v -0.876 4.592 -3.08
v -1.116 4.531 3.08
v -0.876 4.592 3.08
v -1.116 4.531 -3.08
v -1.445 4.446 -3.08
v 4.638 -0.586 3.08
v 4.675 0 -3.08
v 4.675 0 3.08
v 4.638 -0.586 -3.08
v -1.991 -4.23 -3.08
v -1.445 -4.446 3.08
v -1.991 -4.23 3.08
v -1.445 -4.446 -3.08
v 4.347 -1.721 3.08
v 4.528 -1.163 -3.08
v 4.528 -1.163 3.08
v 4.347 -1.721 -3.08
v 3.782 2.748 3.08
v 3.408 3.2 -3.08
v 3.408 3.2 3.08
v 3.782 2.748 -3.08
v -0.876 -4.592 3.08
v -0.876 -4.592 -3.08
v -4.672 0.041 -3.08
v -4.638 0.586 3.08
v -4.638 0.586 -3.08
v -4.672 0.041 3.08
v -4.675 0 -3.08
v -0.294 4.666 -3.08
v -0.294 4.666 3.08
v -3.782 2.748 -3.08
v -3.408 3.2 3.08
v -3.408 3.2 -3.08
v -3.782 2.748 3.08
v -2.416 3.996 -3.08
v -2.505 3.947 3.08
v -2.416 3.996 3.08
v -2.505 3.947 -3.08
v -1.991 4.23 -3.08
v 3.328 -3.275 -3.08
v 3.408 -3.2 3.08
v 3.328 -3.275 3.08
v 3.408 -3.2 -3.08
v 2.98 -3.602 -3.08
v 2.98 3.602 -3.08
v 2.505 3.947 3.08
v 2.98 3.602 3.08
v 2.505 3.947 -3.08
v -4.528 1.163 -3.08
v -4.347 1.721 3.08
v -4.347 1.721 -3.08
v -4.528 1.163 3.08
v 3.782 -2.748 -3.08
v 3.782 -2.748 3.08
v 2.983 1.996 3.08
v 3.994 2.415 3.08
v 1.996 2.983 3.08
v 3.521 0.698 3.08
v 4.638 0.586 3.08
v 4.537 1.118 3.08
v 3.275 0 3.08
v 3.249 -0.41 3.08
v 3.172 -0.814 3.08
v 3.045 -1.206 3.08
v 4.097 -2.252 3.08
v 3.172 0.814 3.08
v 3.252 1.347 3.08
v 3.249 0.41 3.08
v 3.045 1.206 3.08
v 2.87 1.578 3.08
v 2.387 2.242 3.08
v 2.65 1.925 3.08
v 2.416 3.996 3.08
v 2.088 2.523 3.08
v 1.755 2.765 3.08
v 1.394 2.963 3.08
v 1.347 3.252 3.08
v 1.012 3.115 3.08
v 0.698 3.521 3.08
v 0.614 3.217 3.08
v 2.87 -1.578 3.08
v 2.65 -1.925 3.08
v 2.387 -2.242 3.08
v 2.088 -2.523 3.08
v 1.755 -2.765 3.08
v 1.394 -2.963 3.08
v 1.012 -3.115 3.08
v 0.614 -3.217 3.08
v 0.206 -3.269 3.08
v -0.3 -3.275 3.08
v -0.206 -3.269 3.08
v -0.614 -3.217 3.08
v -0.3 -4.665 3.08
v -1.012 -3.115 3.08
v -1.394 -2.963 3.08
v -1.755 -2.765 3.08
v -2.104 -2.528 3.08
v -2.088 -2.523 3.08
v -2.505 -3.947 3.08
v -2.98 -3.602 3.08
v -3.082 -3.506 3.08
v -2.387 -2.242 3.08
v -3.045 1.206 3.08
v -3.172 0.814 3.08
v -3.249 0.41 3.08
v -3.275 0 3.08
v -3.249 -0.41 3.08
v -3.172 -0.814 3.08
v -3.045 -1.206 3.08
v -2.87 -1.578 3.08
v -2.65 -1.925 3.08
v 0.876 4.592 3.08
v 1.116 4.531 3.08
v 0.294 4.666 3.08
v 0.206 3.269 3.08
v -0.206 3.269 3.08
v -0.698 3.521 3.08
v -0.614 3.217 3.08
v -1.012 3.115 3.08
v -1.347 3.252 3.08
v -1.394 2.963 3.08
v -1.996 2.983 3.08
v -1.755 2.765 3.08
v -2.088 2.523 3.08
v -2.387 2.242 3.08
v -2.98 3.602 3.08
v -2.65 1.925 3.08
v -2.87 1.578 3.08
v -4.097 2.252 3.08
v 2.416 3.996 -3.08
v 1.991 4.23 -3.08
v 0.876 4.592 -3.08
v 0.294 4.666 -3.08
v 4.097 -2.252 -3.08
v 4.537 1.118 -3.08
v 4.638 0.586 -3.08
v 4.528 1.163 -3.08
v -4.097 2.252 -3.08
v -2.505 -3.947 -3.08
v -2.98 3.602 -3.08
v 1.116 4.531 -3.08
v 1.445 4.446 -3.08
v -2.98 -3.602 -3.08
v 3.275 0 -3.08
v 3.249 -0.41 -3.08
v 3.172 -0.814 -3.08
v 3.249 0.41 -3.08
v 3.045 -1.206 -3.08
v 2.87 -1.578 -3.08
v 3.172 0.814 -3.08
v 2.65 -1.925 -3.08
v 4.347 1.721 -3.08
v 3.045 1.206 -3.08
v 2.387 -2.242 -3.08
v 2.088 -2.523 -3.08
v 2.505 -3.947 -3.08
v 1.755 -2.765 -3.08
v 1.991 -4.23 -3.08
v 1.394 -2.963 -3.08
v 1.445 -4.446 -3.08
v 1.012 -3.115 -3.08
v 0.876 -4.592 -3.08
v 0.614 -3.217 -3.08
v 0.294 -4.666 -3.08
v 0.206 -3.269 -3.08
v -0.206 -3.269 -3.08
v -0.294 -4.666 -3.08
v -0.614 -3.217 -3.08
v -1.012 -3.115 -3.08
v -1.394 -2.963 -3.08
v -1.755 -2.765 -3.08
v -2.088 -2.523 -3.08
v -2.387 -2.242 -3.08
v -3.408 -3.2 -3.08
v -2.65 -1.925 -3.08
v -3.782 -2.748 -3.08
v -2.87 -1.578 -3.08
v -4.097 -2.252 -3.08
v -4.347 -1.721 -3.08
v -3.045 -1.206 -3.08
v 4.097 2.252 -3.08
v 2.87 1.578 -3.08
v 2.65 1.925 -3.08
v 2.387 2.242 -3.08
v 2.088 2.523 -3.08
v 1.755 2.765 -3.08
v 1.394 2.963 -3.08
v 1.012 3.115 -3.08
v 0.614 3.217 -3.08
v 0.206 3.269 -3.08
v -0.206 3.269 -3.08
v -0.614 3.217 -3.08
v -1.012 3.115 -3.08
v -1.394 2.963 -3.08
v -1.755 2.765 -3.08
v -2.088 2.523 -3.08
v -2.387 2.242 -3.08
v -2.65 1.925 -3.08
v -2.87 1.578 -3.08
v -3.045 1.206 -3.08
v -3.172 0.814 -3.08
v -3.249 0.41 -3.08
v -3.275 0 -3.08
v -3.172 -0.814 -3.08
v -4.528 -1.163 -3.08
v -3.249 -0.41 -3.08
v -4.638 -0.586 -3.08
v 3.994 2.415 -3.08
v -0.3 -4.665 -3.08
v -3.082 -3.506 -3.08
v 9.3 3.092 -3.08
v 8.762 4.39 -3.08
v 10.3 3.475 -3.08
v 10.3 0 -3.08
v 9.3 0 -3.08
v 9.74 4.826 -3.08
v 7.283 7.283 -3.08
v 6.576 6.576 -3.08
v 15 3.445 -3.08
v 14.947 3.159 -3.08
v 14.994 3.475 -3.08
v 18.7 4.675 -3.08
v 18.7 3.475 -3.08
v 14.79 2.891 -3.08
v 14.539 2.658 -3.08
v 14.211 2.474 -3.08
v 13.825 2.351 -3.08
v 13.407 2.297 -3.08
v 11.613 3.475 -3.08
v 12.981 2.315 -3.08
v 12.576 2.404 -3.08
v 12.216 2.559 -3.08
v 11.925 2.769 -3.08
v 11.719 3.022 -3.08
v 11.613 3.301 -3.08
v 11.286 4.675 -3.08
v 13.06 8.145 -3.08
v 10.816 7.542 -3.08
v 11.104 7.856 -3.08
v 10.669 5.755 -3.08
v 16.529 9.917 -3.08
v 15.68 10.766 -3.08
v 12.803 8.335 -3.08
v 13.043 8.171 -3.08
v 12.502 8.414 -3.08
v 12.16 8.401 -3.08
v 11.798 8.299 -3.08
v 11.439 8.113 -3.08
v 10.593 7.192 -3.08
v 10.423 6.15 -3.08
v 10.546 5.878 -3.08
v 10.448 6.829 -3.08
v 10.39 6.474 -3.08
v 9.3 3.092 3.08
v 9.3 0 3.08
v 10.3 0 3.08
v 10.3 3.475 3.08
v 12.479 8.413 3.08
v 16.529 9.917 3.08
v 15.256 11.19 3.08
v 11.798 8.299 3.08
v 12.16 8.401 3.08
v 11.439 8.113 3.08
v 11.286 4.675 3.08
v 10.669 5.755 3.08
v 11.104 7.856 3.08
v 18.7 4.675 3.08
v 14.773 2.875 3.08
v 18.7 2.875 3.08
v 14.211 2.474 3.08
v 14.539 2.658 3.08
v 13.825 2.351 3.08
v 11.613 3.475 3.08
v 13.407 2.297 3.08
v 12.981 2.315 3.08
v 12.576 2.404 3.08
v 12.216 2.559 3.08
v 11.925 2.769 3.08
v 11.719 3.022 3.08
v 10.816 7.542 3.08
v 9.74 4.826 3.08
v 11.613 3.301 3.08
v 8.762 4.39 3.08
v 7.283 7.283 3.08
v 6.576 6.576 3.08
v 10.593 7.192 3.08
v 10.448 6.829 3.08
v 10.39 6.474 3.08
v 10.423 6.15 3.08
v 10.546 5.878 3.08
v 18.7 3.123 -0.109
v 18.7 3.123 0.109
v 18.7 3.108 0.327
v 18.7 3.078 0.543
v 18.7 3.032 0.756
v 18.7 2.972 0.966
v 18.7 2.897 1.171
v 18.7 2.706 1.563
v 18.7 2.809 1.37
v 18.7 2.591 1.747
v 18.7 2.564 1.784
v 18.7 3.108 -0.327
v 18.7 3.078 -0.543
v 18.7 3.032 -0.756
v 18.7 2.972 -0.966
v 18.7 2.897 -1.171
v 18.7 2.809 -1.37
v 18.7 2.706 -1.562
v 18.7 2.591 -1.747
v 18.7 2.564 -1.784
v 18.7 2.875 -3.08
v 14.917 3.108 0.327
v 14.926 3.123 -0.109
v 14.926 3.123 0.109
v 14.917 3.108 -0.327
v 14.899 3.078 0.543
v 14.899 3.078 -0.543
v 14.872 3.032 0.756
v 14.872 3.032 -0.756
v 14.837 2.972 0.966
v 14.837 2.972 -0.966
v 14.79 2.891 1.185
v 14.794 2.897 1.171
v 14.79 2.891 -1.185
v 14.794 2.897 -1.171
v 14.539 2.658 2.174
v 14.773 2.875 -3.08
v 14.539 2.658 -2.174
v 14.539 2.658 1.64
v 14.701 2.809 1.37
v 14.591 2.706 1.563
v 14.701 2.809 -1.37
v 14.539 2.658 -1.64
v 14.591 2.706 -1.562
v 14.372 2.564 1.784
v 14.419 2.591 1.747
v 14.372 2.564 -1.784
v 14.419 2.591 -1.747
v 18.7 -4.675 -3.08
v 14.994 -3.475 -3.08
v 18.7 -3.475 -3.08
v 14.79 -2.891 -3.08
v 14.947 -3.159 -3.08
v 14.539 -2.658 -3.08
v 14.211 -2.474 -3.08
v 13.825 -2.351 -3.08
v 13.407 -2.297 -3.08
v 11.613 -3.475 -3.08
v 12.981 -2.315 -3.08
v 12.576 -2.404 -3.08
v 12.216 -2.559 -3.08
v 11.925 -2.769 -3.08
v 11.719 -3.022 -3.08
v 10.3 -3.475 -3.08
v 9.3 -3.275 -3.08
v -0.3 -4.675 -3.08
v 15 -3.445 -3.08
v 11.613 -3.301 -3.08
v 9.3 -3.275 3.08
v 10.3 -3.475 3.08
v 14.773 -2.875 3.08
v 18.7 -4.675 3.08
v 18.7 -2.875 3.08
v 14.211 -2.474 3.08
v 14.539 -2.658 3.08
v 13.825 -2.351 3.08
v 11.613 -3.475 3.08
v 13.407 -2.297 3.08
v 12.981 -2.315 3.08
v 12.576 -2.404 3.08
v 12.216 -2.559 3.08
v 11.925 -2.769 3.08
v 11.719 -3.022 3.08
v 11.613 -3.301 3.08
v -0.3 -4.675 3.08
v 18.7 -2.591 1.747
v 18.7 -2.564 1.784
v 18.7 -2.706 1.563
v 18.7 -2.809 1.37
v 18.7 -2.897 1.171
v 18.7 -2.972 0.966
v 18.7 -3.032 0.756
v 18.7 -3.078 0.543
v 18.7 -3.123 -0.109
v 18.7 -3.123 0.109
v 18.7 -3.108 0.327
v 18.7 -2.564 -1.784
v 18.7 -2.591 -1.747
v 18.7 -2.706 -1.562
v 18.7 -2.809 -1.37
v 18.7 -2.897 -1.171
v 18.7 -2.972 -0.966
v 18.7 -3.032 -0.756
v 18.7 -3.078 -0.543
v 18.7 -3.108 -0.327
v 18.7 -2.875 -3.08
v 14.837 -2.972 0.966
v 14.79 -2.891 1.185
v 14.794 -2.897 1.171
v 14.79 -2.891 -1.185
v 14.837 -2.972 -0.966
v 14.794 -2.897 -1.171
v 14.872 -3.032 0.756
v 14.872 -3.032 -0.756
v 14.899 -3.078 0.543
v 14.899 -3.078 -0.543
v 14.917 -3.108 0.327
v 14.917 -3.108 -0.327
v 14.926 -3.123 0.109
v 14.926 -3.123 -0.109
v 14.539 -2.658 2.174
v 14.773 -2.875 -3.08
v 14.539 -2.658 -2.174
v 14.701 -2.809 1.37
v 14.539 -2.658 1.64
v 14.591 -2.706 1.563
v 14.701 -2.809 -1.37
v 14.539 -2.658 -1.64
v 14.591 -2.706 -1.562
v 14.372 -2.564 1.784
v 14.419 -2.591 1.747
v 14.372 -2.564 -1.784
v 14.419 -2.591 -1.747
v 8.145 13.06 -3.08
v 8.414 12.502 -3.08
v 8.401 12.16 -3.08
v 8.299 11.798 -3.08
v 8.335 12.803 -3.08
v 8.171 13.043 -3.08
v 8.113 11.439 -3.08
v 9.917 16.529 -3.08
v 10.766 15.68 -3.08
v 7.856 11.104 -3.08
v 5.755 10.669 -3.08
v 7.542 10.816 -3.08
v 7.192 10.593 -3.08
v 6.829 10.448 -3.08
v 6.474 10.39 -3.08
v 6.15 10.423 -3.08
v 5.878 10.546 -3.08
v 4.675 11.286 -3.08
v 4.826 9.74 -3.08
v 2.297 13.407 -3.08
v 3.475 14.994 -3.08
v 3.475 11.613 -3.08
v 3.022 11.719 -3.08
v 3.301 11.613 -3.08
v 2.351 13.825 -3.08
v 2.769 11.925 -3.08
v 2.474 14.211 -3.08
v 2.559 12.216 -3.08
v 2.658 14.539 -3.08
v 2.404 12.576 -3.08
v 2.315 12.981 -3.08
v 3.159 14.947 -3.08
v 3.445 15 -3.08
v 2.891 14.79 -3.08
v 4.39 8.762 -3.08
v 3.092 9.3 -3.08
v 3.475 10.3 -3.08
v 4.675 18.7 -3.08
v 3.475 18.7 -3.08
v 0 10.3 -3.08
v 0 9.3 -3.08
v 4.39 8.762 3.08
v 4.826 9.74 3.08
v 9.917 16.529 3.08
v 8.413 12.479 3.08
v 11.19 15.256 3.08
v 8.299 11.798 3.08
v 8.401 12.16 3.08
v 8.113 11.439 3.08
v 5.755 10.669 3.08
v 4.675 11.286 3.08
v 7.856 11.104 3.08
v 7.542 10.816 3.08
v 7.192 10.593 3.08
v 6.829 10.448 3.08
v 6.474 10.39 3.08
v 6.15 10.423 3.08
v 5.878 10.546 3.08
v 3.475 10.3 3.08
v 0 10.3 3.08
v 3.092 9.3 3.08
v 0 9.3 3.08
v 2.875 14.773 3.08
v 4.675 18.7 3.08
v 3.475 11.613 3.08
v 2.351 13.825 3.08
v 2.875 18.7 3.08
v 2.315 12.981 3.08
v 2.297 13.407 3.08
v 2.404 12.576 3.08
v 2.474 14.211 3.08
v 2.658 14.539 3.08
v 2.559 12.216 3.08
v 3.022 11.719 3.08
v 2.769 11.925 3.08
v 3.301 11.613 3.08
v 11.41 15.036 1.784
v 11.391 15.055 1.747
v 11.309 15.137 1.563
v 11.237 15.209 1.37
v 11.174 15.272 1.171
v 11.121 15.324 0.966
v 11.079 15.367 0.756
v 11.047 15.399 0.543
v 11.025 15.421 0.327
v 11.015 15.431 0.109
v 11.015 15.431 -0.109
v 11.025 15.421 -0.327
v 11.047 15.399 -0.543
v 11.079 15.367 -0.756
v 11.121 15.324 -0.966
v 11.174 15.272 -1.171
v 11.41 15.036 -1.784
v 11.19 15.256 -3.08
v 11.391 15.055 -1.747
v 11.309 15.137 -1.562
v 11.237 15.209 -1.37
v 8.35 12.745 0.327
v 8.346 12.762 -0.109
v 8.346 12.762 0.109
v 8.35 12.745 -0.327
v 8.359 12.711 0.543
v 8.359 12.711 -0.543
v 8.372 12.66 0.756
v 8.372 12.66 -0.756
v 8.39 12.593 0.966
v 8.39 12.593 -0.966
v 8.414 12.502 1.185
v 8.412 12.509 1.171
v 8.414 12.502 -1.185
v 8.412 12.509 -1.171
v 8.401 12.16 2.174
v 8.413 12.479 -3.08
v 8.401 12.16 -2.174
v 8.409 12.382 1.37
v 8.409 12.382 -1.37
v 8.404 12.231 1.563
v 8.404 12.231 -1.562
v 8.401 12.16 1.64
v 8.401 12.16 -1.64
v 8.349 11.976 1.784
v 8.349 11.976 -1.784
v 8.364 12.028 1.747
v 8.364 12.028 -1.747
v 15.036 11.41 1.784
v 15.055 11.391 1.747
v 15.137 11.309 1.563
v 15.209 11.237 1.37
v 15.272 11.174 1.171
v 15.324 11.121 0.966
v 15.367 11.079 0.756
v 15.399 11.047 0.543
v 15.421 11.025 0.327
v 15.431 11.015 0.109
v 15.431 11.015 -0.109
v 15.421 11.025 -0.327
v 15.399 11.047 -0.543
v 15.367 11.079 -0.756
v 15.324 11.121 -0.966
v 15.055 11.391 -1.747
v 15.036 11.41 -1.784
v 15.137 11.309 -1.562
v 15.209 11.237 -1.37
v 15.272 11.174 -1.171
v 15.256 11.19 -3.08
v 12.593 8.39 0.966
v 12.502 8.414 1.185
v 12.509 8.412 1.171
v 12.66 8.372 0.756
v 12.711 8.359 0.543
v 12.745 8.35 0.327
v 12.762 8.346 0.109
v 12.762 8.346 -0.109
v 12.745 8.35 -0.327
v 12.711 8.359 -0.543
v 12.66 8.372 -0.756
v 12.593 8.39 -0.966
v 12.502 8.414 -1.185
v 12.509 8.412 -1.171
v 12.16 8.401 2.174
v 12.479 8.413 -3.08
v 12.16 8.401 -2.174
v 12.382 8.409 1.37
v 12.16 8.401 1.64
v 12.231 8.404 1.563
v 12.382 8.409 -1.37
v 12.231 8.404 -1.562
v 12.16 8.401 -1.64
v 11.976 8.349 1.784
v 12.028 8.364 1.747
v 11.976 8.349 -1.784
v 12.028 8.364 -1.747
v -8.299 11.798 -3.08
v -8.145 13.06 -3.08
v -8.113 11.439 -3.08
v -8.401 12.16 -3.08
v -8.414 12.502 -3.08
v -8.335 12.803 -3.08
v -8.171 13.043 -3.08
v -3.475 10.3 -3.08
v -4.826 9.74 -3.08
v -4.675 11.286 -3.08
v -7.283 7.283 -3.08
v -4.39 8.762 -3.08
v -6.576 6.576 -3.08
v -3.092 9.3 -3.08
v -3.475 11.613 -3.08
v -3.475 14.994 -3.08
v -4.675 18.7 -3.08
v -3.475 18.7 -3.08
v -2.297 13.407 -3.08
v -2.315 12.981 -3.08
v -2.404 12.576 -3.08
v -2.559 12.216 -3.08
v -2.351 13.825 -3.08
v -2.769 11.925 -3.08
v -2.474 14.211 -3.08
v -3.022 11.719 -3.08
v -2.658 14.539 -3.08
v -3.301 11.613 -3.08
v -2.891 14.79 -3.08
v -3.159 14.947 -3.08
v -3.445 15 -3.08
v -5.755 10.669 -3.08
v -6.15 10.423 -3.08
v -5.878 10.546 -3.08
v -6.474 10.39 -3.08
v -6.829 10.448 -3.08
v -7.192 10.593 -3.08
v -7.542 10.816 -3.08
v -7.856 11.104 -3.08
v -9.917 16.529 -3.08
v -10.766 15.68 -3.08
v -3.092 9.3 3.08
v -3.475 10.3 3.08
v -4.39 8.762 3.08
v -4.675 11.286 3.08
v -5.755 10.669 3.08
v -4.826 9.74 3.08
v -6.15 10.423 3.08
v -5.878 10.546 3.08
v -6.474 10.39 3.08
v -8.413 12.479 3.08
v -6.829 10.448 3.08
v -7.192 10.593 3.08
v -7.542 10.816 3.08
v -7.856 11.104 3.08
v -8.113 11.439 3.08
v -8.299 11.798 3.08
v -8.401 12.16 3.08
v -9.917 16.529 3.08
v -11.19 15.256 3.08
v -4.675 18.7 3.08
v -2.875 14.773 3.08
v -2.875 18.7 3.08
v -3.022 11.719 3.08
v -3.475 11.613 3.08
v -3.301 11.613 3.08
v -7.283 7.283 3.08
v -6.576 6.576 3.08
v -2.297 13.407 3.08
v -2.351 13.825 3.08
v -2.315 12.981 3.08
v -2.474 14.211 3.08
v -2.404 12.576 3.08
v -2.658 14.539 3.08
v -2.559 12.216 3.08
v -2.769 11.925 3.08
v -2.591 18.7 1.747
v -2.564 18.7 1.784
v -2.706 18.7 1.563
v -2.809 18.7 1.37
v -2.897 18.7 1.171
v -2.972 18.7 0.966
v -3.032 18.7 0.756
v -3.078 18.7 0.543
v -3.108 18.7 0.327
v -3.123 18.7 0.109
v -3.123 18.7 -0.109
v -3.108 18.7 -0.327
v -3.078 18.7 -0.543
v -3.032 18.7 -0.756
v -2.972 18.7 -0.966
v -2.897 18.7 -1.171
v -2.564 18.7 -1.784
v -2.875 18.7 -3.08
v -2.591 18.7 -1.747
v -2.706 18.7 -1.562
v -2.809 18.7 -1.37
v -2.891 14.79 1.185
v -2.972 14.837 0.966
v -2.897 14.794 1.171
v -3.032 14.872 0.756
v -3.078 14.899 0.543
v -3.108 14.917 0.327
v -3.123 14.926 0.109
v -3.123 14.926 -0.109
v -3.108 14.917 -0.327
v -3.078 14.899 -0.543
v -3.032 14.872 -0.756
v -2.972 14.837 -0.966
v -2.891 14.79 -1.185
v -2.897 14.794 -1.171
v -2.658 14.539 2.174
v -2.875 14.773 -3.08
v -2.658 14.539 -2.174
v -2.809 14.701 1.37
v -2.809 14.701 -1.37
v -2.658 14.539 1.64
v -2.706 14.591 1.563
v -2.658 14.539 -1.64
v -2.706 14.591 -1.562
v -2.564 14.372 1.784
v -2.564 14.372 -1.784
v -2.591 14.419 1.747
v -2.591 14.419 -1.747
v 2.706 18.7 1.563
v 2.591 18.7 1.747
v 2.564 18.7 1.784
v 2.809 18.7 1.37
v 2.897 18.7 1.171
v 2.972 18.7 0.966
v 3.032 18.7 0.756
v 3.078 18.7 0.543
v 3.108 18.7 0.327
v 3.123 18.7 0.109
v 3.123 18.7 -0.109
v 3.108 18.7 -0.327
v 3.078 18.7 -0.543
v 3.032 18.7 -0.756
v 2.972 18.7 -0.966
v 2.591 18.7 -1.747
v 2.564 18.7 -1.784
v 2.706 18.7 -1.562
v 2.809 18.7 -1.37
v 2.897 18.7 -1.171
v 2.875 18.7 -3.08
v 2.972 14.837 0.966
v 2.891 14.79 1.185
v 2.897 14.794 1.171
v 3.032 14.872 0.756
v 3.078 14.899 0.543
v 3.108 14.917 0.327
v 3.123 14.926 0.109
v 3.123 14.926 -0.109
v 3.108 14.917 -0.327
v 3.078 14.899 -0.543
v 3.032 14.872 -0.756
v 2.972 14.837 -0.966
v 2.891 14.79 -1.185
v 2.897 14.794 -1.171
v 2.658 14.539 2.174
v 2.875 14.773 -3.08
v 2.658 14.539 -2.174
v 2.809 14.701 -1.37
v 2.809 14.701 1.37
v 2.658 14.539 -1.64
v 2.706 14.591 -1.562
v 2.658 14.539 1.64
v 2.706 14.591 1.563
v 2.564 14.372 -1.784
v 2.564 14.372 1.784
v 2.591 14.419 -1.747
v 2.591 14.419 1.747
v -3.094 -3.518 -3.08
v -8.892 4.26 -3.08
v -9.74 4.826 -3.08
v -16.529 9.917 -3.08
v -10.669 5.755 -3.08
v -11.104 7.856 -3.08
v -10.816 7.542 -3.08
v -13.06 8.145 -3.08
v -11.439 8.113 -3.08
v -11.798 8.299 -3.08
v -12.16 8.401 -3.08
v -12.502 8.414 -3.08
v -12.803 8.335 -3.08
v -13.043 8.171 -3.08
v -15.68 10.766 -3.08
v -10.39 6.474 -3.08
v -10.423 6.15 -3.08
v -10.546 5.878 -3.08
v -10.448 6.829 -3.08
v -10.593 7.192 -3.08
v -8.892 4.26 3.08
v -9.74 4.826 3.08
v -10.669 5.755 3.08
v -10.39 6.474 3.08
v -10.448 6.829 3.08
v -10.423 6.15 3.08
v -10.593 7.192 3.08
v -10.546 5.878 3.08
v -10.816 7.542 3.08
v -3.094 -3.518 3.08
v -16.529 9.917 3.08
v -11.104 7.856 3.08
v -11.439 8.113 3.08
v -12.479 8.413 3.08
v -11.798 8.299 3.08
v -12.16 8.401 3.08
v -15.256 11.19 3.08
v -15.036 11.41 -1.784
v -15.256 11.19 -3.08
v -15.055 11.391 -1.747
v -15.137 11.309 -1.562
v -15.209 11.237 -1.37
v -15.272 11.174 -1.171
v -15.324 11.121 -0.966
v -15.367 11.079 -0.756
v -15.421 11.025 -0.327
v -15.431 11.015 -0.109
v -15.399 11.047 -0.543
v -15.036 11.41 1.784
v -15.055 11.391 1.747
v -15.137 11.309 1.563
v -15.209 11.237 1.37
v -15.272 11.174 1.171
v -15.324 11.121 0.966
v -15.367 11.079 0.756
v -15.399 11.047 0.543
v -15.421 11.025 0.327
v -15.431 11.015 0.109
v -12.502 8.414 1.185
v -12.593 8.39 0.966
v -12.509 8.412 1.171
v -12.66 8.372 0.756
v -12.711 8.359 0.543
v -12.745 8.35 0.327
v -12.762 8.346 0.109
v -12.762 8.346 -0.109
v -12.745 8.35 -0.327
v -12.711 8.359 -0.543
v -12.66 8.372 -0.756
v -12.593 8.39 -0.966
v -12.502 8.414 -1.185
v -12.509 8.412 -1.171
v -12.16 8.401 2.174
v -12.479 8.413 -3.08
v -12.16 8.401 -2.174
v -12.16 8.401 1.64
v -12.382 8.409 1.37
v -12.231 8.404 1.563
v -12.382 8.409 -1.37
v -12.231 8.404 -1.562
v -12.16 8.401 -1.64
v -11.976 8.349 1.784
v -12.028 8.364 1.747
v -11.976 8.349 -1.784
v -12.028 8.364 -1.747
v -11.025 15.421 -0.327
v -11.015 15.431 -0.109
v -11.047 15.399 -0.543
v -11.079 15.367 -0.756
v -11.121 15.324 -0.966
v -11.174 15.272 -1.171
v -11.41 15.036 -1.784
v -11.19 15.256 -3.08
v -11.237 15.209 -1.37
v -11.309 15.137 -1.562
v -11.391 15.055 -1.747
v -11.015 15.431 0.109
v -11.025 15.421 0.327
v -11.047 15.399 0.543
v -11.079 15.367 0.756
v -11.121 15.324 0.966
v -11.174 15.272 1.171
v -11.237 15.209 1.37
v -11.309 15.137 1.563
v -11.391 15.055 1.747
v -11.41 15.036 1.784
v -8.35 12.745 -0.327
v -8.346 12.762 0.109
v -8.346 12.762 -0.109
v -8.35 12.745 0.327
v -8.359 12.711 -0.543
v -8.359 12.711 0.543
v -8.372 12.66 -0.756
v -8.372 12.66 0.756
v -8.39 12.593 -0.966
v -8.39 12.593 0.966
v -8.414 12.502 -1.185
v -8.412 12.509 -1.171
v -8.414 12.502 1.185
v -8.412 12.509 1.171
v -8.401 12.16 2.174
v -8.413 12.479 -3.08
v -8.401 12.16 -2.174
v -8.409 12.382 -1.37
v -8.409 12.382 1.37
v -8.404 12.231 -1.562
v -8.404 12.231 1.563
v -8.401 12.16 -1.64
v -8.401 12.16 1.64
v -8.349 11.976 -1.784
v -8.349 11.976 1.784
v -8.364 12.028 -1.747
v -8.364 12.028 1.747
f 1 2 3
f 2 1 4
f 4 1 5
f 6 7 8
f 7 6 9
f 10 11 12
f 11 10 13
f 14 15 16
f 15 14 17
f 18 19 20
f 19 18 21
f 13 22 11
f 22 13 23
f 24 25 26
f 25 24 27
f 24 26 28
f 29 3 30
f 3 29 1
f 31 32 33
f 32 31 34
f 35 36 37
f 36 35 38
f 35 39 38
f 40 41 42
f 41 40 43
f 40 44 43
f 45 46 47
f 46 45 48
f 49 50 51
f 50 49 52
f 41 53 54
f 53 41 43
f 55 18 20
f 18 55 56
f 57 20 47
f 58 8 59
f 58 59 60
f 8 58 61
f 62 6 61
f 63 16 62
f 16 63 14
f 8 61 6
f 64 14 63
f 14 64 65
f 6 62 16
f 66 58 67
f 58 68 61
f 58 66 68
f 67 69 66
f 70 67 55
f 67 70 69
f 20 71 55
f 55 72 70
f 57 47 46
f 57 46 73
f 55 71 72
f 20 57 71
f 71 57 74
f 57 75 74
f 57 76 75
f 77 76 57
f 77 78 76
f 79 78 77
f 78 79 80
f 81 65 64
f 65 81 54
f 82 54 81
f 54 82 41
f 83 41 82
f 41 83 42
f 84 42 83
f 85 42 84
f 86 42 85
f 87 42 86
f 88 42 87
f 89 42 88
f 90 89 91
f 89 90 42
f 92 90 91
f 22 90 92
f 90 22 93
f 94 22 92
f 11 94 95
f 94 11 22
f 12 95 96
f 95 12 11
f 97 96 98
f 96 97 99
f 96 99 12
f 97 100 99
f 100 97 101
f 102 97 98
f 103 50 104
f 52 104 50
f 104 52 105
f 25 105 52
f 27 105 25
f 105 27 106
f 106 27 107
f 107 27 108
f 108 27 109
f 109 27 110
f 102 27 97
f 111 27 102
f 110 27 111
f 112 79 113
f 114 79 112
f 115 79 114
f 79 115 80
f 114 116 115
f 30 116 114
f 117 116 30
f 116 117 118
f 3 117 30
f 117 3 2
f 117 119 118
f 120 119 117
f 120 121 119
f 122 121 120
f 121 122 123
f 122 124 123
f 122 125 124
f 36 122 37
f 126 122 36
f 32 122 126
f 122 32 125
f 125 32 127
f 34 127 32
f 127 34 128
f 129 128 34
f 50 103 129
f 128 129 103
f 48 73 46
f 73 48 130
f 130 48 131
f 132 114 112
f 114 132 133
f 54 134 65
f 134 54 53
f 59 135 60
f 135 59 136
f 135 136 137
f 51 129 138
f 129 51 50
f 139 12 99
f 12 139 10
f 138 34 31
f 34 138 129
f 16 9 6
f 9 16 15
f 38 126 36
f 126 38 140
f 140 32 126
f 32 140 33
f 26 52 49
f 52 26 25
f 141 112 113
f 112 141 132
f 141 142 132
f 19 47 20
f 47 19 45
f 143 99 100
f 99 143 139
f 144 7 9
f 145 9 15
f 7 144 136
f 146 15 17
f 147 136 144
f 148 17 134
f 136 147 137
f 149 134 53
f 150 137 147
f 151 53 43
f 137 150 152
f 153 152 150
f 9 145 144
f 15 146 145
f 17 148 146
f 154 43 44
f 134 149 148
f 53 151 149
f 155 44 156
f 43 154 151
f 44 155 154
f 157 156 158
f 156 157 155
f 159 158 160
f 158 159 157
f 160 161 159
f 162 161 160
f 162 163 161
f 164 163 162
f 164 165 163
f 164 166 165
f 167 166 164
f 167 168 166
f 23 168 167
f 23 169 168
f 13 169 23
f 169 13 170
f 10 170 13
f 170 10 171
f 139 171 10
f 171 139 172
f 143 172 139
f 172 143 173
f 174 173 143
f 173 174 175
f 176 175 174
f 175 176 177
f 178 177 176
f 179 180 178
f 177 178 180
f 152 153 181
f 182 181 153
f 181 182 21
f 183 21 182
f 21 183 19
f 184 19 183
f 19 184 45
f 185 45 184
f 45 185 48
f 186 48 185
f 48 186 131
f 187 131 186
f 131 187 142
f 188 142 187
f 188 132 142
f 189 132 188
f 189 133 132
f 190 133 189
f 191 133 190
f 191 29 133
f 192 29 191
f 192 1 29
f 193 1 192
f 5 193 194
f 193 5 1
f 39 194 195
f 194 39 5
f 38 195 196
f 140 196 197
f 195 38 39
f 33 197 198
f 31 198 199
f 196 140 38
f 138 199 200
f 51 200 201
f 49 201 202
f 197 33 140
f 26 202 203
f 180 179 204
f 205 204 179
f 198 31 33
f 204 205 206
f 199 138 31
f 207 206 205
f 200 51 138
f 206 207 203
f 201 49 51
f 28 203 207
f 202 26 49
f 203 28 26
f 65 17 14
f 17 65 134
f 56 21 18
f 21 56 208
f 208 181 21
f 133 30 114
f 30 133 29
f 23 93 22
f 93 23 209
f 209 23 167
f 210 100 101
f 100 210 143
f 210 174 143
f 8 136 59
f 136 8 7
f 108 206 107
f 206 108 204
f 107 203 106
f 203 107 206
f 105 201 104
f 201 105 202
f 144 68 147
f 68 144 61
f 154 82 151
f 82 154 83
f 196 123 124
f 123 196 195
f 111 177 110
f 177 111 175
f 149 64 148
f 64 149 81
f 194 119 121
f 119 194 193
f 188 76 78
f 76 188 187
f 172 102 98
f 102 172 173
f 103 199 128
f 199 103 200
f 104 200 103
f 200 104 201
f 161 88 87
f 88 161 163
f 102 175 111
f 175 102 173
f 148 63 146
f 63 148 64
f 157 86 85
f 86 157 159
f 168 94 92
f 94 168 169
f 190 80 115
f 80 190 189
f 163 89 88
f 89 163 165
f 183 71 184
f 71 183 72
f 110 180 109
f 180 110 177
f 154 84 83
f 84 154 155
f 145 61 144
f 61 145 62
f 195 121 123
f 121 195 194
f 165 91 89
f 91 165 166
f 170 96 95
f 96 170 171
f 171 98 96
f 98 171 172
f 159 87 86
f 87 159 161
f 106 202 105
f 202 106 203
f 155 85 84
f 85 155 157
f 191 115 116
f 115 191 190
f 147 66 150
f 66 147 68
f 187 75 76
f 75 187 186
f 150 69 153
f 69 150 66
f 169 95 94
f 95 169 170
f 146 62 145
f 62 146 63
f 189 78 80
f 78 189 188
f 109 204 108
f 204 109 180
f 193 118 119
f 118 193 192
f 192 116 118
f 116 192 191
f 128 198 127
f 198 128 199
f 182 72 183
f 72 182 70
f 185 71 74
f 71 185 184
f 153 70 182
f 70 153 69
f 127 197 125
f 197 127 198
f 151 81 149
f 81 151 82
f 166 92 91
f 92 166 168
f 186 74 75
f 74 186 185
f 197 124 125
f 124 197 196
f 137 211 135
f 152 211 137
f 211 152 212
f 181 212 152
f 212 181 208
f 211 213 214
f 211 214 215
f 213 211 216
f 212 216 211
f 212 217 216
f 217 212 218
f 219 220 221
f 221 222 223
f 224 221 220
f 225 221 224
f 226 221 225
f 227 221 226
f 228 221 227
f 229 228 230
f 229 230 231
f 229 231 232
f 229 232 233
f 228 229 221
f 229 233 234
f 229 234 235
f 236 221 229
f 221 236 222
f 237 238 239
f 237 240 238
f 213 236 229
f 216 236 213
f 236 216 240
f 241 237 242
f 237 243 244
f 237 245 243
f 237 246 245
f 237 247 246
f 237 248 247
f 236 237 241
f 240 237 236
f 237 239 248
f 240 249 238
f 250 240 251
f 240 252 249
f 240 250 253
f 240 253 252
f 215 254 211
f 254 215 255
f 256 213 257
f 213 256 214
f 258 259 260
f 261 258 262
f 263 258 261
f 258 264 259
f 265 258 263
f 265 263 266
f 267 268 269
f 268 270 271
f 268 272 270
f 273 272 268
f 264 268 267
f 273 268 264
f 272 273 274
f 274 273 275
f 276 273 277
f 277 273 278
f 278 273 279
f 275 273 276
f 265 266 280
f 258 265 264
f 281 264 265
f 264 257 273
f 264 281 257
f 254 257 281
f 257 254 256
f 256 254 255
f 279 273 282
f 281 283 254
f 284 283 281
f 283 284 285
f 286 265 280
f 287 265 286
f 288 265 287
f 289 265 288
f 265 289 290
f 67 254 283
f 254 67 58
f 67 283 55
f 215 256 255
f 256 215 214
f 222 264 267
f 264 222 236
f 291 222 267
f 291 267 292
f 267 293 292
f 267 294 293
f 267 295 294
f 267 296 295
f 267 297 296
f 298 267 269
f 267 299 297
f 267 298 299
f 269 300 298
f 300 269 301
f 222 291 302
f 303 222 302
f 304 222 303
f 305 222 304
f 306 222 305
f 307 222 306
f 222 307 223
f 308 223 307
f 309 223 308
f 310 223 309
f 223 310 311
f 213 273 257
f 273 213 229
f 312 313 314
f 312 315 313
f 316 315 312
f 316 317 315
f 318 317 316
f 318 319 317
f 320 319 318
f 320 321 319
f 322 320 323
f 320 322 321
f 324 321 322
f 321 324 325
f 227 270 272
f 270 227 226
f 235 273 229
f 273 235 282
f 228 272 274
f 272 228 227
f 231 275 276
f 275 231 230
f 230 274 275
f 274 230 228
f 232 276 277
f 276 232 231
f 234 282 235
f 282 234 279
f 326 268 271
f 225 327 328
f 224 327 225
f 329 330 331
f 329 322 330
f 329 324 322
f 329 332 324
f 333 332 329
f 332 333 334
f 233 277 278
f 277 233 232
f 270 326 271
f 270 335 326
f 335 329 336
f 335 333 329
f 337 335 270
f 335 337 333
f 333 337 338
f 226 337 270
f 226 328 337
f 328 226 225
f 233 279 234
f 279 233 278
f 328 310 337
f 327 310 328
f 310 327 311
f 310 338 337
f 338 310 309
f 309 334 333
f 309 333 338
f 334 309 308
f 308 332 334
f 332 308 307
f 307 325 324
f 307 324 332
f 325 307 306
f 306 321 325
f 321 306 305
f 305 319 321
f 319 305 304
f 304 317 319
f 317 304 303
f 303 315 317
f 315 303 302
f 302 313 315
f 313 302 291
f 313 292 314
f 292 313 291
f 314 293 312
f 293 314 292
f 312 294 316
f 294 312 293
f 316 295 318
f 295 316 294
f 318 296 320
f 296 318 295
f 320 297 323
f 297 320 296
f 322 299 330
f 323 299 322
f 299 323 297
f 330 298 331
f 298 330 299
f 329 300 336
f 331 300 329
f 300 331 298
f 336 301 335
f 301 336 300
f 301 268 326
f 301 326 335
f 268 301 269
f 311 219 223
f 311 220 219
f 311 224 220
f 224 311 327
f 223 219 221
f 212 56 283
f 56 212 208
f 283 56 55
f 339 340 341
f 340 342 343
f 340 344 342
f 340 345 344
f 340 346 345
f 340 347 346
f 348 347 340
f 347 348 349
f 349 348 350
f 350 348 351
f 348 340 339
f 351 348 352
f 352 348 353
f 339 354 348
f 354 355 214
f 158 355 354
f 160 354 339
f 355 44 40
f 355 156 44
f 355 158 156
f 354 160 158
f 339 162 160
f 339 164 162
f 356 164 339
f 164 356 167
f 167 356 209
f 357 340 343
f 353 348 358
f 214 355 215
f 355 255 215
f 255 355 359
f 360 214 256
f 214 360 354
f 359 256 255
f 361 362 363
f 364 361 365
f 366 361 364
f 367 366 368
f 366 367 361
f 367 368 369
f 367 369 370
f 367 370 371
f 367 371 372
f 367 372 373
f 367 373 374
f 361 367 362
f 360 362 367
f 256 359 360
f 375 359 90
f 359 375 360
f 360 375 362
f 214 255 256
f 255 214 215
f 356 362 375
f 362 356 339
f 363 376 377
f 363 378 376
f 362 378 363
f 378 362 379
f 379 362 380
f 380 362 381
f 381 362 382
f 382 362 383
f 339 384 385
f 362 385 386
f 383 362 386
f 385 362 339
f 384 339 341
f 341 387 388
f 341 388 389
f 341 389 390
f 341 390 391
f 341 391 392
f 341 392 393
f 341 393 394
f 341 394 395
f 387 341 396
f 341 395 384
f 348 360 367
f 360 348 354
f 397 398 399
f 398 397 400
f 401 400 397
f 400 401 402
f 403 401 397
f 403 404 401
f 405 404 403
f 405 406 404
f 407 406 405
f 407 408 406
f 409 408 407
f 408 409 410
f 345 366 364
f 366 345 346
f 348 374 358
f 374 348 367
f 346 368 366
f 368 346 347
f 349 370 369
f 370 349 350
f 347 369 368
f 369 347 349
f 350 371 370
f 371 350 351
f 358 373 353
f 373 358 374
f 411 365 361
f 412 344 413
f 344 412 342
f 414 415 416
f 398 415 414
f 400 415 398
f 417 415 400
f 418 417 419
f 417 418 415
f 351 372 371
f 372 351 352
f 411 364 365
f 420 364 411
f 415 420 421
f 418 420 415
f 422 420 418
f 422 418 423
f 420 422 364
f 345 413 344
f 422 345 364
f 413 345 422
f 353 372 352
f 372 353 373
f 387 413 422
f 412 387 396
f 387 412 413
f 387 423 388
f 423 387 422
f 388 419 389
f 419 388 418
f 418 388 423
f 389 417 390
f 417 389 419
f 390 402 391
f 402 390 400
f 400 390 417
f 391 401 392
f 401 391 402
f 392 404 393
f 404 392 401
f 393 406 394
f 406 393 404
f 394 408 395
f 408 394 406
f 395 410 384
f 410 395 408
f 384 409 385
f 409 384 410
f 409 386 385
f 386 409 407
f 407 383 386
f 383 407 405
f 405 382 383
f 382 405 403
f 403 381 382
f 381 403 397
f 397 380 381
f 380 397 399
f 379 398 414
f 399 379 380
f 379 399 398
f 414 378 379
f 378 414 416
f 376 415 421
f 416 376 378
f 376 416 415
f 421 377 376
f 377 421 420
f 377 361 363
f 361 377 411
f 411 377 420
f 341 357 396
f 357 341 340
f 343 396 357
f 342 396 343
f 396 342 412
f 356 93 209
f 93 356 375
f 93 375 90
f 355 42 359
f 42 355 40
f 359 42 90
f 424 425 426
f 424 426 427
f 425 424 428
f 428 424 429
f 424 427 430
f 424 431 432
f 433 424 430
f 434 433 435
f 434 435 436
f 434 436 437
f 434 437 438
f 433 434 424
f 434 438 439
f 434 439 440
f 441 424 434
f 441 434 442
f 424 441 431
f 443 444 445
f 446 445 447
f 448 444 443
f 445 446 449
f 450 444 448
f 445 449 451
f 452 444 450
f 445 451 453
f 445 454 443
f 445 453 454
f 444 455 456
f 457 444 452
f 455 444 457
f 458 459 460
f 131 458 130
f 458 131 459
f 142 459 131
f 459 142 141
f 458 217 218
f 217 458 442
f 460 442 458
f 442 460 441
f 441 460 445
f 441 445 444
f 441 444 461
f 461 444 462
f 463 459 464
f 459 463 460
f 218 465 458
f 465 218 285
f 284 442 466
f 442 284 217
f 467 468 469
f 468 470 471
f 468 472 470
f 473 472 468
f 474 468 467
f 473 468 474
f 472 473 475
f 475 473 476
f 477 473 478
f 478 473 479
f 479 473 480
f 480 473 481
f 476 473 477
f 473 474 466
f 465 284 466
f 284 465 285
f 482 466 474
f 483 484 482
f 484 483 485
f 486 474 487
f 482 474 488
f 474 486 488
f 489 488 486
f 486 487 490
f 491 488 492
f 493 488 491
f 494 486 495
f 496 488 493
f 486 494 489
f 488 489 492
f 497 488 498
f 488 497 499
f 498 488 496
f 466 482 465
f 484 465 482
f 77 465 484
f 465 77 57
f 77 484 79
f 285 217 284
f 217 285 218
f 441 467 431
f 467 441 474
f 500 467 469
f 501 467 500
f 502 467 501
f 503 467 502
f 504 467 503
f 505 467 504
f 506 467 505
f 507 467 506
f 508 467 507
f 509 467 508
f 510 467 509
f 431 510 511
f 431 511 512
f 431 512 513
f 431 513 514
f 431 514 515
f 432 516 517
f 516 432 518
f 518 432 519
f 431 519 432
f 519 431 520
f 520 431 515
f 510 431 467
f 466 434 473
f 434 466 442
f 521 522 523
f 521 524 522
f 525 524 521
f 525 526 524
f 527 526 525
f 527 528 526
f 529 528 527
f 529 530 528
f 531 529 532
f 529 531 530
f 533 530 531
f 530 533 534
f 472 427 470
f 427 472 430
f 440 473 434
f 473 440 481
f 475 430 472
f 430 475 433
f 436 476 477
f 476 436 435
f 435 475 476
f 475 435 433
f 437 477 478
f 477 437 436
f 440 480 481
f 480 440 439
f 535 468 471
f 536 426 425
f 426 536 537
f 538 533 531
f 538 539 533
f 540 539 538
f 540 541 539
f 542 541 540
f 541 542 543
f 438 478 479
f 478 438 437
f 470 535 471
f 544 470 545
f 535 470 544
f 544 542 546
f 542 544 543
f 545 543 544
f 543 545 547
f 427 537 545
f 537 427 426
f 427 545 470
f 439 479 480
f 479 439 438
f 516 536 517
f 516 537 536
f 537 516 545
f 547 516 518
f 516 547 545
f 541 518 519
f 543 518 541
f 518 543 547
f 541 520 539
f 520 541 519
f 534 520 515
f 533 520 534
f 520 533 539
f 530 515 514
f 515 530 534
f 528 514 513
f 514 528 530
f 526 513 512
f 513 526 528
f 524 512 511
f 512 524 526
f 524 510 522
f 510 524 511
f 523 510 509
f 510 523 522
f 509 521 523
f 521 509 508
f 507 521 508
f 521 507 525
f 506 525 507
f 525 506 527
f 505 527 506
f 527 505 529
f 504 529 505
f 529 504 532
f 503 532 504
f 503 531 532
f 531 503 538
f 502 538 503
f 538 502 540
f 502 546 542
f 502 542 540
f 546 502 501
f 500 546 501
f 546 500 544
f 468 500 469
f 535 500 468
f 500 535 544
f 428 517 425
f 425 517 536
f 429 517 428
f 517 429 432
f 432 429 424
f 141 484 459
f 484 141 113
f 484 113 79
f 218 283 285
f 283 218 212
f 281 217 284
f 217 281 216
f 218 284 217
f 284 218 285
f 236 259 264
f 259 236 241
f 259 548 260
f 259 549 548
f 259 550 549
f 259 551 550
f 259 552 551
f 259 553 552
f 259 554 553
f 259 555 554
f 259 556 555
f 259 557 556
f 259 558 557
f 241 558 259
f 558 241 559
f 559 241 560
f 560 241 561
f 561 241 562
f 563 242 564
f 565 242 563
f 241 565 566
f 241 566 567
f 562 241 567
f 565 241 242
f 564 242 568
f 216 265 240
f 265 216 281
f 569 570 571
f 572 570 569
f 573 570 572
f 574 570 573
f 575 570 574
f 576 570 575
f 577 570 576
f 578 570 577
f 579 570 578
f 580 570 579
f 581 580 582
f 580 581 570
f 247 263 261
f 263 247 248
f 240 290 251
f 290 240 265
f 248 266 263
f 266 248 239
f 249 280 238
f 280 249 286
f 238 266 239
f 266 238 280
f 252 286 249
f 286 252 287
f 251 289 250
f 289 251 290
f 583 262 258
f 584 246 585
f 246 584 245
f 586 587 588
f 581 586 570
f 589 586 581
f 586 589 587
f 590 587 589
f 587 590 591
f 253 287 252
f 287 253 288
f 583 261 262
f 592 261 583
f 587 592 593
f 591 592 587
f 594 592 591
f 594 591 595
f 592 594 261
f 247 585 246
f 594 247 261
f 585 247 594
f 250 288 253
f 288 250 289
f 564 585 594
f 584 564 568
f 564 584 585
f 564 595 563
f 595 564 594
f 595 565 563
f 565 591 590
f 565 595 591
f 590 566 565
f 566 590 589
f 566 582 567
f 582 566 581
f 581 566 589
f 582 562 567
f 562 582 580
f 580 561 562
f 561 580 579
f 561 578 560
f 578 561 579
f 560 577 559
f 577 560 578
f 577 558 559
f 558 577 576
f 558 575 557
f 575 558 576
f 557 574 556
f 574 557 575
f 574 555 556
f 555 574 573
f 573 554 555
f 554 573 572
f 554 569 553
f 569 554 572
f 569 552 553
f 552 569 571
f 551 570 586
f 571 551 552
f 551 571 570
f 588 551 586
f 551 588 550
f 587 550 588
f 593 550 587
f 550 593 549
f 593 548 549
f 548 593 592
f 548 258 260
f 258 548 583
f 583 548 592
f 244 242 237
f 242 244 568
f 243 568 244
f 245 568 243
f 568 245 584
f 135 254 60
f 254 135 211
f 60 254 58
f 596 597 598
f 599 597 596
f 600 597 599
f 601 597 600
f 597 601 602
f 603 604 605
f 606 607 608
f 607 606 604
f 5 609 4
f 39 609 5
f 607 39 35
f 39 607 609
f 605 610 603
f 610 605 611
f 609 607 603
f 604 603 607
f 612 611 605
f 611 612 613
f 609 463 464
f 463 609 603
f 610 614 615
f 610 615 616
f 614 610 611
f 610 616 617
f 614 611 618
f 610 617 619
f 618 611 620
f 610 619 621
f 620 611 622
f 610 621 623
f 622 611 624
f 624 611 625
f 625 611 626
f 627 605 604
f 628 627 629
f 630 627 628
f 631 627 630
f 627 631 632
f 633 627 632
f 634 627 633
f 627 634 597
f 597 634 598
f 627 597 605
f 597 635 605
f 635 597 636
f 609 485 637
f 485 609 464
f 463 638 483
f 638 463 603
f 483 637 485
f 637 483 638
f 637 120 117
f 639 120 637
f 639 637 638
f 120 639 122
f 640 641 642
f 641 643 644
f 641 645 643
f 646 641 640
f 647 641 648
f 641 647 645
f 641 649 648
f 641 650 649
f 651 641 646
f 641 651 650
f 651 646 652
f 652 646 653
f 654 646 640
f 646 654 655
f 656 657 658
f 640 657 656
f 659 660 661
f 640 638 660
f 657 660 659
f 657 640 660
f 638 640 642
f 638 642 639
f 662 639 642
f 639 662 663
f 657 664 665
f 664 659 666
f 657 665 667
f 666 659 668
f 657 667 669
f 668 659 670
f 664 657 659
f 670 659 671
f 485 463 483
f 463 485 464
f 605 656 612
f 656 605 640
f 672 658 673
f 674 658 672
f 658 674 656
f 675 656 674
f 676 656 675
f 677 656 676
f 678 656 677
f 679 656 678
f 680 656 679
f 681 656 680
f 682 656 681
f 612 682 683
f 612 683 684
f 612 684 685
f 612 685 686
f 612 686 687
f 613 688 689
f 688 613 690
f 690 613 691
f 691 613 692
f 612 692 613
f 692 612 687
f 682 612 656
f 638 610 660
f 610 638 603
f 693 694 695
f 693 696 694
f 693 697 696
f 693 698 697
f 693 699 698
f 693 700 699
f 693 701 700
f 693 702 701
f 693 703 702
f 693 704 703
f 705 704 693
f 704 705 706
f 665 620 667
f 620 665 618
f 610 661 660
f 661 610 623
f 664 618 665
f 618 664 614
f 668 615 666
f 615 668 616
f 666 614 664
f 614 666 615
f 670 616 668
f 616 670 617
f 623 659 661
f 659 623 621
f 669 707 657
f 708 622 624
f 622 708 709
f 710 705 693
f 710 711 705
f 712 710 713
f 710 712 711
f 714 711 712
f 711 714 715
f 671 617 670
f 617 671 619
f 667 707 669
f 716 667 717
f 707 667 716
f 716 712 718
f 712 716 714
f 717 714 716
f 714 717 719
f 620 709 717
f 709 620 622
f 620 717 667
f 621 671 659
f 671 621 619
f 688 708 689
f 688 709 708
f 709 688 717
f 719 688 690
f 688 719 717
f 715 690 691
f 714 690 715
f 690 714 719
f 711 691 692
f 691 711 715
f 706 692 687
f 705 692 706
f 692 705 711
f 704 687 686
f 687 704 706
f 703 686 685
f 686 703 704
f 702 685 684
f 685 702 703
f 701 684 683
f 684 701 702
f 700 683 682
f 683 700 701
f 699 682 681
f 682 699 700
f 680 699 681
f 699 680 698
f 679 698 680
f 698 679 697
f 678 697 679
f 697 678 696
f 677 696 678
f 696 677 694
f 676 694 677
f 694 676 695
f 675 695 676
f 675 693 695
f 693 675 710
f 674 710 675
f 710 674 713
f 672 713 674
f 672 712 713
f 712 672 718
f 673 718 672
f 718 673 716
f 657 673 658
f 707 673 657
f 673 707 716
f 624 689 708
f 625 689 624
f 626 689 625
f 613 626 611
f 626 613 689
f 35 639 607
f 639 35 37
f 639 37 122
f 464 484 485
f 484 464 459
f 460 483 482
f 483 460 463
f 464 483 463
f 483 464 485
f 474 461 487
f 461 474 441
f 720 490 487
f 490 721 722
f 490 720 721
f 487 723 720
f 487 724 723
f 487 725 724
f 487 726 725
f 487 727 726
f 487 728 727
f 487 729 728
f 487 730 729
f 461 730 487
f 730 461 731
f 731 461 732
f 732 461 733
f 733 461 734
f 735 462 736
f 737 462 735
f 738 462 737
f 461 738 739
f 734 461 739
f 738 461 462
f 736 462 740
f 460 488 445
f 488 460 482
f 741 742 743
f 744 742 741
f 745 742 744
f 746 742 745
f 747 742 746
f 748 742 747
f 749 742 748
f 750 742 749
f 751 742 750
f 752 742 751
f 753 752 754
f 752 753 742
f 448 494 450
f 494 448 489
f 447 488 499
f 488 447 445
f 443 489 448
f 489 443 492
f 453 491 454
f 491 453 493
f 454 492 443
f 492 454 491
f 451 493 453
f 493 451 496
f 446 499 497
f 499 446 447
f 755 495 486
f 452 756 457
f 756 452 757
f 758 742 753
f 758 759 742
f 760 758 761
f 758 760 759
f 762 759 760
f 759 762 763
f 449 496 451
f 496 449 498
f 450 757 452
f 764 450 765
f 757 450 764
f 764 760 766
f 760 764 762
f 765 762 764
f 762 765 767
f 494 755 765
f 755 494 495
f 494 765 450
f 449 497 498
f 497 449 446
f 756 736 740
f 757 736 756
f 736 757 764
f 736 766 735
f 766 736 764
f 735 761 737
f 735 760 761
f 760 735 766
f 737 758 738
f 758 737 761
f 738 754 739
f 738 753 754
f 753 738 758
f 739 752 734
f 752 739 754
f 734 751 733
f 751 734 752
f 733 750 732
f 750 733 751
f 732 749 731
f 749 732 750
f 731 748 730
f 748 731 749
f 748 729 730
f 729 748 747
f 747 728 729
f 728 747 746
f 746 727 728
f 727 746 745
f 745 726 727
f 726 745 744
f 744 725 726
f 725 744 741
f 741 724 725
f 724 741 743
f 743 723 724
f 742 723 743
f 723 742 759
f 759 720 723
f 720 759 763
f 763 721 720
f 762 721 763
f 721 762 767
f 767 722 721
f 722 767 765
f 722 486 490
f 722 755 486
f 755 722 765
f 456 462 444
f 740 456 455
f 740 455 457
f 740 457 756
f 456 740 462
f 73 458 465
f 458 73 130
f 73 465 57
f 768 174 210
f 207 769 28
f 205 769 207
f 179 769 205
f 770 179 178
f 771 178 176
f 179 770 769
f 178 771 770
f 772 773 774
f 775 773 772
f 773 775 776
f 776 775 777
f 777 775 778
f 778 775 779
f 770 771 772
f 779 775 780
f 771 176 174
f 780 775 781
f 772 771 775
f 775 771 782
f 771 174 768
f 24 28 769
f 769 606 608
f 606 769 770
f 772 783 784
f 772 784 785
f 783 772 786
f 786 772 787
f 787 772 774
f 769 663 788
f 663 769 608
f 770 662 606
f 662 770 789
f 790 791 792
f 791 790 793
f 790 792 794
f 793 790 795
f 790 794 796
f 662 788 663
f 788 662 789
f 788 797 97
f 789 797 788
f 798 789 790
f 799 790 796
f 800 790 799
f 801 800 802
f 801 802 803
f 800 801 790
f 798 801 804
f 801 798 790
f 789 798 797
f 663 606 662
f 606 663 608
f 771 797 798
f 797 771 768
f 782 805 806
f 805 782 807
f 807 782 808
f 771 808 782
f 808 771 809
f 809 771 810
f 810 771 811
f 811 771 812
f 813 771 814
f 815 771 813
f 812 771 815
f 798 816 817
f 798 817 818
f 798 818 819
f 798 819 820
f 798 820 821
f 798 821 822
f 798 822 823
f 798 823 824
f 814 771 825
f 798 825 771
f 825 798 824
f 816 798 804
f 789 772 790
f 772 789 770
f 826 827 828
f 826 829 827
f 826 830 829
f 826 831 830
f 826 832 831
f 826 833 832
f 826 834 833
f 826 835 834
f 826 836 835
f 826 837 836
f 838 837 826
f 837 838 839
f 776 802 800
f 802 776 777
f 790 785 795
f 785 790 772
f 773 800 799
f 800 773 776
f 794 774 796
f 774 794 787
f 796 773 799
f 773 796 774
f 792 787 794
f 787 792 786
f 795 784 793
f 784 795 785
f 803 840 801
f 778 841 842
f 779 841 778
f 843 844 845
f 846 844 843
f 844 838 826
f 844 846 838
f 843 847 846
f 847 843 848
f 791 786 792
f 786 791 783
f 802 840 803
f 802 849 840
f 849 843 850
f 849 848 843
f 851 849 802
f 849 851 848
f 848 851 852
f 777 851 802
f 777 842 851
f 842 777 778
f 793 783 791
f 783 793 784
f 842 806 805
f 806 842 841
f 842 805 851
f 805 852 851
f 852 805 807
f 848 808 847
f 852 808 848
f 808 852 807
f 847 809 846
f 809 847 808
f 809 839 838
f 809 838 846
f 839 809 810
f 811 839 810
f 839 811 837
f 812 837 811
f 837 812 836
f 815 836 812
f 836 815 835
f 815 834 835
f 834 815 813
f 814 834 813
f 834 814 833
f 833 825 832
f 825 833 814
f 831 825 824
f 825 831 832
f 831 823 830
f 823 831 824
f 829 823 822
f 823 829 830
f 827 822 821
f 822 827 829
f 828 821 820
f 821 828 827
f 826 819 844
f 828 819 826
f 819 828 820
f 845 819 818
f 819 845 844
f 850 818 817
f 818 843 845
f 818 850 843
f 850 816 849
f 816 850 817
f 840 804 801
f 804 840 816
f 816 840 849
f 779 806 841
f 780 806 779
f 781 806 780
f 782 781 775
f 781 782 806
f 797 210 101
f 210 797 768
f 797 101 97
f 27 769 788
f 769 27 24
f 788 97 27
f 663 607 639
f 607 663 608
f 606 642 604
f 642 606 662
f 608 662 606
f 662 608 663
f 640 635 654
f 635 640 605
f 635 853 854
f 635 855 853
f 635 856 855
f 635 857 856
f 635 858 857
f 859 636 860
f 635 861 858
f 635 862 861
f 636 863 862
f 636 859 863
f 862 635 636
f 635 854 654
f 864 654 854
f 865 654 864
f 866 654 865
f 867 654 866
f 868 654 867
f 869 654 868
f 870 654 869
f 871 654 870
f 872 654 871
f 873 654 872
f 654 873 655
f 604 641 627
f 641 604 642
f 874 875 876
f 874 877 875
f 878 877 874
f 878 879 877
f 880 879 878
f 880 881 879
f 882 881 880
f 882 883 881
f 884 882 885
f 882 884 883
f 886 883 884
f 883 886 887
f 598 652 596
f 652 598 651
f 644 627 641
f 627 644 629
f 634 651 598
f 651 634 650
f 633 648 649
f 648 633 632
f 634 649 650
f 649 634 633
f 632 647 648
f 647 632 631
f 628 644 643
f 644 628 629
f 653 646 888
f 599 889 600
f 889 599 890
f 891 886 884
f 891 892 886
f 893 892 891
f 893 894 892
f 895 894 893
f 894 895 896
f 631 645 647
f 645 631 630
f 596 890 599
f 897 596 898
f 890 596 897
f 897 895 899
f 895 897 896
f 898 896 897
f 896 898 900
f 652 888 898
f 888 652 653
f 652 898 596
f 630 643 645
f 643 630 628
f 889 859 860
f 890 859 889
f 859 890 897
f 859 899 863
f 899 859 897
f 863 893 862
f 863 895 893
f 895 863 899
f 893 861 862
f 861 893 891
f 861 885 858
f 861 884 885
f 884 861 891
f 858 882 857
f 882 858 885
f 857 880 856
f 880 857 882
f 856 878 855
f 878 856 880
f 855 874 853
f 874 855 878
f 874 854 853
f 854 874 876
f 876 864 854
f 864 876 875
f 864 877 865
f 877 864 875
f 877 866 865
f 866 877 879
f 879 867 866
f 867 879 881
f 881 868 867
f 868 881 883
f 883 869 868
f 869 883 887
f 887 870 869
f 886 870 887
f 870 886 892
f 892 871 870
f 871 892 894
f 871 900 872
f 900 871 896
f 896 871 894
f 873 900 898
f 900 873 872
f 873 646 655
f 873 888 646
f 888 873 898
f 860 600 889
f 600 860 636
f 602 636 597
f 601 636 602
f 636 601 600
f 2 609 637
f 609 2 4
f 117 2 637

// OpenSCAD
// file: lib/knex_lib.scad
// K'Nex Parts Library — shared modules for all part SCADs
// Geometry derived from https://www.printables.com/model/143840-knex-parts-customizable
// Measurements in millimeters (digital calipers)

knexDiameter = 6.25;

// --- Rod modules ---

module RodEnd(height) {
    difference() {
        cylinder(h=height, d=knexDiameter, $fn=50);
        // Snap groove near the tip
        translate([0, 0, height - 3.1])
        scale([1, 1, 1.93])
        rotate_extrude(convexity=10, $fn=30)
        translate([3.125, 0, 0])
        scale([1, 1, 0])
        circle(r=0.905, $fn=20);
    }
}

module RodCenter(length) {
    // Cross-shaped center section (+ profile)
    intersection() {
        cylinder(h=length, d=knexDiameter, $fn=50);
        union() {
            translate([-.95, -knexDiameter/2, 0])
            cube([1.9, knexDiameter + 1, length]);
            translate([-knexDiameter/2, -.95, 0])
            cube([knexDiameter + 1, 1.9, length]);
        }
    }
}

module fullRod(endHeight, centerLength) {
    // Builds along Z: from -endHeight to centerLength+endHeight
    translate([0, 0, centerLength])
    RodEnd(endHeight);
    RodCenter(centerLength);
    mirror([0, 0, 1])
    RodEnd(endHeight);
}

module fullRod2(externalLength, internalLength) {
    // Convenience: specify overall and center-section lengths
    fullRod((externalLength - internalLength) / 2, internalLength);
}

// --- Connector modules ---

module ConnectorCenter(height, width) {
    difference() {
        cylinder(h=height, d=6.55 + width * 2, $fn=50);
        translate([0, 0, -0.5])
        cylinder(h=height + 1, d=6.55, $fn=50);
    }
}

module ConnectorEndpt(i, c, a, j) {
    union() {
        translate([0, 0, 9.4 - 1])
        cube([6.16, 9.35/2, 1]);
        cube([6.16, 1.2, 9.4]);
        translate([6.16/2, 1.23, 6.16 - 3.8/5])
        scale([1, 2.3, 3.4])
        rotate([0, 90, 0])
        cylinder(d=1, h=6.16, $fn=25, center=true);
        linear_extrude(height=6)
        difference() {
            polygon(points=[
                [0, 0], [6.16, 0], [6.16, 1.8],
                [6.16 - 1.46, 2.15], [1.46, 2.15], [0, 1.8]
            ]);
            translate([6.16/2, 9.35/2, 0])
            circle(d=6.25, $fn=90);
        }
    }
    if (i > 0) {
        if ((((i == c && j == 1) || (i == 1 && j == 2)) && c < 8) || a - 360 > 80) {
            // Straight locking tab (for end arms or wide-angle connectors)
            translate([0, 0, 9])
            cube([6.16, 1.4, 10]);
        }
        else {
            // Angled locking tab (for tight-angle connectors)
            translate([0, 0, 9.25])
            rotate([-45/2])
            cube([6.16, 1.4, 7]);
        }
    }
}

module ConnectorEnd(i=0, c=0, a=45) {
    translate([0, -9.35/2, 6.16])
    rotate([0, 90, 0])
    union() {
        ConnectorEndpt(i, c, a, 1);
        translate([0, 9.35, 0])
        mirror([0, 1, 0])
        ConnectorEndpt(i, c, a, 2);
    }
}

// Arm offset from center to ConnectorEnd origin
_arm_offset = -(23.15 - (6.5 + 1.4) / 2) + 0.5;

module Connector(c, a=45) {
    // c = number of arms, a = angle parameter (use 360+spacing for proper tab logic)
    // Effective arm spacing = a mod 360
    union() {
        ConnectorCenter(6.16, 1.4);
        for (i = [1:c]) {
            rotate([0, 0, (i-1) * a])
            translate([_arm_offset, 0, 0])
            ConnectorEnd(i, c, a);
        }
    }
}
// main file
// K'NEX Green 4-Way Connector (4 arms at 45° spacing, 135° total)
include <lib/knex_lib.scad>
$fn = 72;

translate([0, 0, -6.16/2])
rotate([0, 0, 180])
Connector(4, 405);
